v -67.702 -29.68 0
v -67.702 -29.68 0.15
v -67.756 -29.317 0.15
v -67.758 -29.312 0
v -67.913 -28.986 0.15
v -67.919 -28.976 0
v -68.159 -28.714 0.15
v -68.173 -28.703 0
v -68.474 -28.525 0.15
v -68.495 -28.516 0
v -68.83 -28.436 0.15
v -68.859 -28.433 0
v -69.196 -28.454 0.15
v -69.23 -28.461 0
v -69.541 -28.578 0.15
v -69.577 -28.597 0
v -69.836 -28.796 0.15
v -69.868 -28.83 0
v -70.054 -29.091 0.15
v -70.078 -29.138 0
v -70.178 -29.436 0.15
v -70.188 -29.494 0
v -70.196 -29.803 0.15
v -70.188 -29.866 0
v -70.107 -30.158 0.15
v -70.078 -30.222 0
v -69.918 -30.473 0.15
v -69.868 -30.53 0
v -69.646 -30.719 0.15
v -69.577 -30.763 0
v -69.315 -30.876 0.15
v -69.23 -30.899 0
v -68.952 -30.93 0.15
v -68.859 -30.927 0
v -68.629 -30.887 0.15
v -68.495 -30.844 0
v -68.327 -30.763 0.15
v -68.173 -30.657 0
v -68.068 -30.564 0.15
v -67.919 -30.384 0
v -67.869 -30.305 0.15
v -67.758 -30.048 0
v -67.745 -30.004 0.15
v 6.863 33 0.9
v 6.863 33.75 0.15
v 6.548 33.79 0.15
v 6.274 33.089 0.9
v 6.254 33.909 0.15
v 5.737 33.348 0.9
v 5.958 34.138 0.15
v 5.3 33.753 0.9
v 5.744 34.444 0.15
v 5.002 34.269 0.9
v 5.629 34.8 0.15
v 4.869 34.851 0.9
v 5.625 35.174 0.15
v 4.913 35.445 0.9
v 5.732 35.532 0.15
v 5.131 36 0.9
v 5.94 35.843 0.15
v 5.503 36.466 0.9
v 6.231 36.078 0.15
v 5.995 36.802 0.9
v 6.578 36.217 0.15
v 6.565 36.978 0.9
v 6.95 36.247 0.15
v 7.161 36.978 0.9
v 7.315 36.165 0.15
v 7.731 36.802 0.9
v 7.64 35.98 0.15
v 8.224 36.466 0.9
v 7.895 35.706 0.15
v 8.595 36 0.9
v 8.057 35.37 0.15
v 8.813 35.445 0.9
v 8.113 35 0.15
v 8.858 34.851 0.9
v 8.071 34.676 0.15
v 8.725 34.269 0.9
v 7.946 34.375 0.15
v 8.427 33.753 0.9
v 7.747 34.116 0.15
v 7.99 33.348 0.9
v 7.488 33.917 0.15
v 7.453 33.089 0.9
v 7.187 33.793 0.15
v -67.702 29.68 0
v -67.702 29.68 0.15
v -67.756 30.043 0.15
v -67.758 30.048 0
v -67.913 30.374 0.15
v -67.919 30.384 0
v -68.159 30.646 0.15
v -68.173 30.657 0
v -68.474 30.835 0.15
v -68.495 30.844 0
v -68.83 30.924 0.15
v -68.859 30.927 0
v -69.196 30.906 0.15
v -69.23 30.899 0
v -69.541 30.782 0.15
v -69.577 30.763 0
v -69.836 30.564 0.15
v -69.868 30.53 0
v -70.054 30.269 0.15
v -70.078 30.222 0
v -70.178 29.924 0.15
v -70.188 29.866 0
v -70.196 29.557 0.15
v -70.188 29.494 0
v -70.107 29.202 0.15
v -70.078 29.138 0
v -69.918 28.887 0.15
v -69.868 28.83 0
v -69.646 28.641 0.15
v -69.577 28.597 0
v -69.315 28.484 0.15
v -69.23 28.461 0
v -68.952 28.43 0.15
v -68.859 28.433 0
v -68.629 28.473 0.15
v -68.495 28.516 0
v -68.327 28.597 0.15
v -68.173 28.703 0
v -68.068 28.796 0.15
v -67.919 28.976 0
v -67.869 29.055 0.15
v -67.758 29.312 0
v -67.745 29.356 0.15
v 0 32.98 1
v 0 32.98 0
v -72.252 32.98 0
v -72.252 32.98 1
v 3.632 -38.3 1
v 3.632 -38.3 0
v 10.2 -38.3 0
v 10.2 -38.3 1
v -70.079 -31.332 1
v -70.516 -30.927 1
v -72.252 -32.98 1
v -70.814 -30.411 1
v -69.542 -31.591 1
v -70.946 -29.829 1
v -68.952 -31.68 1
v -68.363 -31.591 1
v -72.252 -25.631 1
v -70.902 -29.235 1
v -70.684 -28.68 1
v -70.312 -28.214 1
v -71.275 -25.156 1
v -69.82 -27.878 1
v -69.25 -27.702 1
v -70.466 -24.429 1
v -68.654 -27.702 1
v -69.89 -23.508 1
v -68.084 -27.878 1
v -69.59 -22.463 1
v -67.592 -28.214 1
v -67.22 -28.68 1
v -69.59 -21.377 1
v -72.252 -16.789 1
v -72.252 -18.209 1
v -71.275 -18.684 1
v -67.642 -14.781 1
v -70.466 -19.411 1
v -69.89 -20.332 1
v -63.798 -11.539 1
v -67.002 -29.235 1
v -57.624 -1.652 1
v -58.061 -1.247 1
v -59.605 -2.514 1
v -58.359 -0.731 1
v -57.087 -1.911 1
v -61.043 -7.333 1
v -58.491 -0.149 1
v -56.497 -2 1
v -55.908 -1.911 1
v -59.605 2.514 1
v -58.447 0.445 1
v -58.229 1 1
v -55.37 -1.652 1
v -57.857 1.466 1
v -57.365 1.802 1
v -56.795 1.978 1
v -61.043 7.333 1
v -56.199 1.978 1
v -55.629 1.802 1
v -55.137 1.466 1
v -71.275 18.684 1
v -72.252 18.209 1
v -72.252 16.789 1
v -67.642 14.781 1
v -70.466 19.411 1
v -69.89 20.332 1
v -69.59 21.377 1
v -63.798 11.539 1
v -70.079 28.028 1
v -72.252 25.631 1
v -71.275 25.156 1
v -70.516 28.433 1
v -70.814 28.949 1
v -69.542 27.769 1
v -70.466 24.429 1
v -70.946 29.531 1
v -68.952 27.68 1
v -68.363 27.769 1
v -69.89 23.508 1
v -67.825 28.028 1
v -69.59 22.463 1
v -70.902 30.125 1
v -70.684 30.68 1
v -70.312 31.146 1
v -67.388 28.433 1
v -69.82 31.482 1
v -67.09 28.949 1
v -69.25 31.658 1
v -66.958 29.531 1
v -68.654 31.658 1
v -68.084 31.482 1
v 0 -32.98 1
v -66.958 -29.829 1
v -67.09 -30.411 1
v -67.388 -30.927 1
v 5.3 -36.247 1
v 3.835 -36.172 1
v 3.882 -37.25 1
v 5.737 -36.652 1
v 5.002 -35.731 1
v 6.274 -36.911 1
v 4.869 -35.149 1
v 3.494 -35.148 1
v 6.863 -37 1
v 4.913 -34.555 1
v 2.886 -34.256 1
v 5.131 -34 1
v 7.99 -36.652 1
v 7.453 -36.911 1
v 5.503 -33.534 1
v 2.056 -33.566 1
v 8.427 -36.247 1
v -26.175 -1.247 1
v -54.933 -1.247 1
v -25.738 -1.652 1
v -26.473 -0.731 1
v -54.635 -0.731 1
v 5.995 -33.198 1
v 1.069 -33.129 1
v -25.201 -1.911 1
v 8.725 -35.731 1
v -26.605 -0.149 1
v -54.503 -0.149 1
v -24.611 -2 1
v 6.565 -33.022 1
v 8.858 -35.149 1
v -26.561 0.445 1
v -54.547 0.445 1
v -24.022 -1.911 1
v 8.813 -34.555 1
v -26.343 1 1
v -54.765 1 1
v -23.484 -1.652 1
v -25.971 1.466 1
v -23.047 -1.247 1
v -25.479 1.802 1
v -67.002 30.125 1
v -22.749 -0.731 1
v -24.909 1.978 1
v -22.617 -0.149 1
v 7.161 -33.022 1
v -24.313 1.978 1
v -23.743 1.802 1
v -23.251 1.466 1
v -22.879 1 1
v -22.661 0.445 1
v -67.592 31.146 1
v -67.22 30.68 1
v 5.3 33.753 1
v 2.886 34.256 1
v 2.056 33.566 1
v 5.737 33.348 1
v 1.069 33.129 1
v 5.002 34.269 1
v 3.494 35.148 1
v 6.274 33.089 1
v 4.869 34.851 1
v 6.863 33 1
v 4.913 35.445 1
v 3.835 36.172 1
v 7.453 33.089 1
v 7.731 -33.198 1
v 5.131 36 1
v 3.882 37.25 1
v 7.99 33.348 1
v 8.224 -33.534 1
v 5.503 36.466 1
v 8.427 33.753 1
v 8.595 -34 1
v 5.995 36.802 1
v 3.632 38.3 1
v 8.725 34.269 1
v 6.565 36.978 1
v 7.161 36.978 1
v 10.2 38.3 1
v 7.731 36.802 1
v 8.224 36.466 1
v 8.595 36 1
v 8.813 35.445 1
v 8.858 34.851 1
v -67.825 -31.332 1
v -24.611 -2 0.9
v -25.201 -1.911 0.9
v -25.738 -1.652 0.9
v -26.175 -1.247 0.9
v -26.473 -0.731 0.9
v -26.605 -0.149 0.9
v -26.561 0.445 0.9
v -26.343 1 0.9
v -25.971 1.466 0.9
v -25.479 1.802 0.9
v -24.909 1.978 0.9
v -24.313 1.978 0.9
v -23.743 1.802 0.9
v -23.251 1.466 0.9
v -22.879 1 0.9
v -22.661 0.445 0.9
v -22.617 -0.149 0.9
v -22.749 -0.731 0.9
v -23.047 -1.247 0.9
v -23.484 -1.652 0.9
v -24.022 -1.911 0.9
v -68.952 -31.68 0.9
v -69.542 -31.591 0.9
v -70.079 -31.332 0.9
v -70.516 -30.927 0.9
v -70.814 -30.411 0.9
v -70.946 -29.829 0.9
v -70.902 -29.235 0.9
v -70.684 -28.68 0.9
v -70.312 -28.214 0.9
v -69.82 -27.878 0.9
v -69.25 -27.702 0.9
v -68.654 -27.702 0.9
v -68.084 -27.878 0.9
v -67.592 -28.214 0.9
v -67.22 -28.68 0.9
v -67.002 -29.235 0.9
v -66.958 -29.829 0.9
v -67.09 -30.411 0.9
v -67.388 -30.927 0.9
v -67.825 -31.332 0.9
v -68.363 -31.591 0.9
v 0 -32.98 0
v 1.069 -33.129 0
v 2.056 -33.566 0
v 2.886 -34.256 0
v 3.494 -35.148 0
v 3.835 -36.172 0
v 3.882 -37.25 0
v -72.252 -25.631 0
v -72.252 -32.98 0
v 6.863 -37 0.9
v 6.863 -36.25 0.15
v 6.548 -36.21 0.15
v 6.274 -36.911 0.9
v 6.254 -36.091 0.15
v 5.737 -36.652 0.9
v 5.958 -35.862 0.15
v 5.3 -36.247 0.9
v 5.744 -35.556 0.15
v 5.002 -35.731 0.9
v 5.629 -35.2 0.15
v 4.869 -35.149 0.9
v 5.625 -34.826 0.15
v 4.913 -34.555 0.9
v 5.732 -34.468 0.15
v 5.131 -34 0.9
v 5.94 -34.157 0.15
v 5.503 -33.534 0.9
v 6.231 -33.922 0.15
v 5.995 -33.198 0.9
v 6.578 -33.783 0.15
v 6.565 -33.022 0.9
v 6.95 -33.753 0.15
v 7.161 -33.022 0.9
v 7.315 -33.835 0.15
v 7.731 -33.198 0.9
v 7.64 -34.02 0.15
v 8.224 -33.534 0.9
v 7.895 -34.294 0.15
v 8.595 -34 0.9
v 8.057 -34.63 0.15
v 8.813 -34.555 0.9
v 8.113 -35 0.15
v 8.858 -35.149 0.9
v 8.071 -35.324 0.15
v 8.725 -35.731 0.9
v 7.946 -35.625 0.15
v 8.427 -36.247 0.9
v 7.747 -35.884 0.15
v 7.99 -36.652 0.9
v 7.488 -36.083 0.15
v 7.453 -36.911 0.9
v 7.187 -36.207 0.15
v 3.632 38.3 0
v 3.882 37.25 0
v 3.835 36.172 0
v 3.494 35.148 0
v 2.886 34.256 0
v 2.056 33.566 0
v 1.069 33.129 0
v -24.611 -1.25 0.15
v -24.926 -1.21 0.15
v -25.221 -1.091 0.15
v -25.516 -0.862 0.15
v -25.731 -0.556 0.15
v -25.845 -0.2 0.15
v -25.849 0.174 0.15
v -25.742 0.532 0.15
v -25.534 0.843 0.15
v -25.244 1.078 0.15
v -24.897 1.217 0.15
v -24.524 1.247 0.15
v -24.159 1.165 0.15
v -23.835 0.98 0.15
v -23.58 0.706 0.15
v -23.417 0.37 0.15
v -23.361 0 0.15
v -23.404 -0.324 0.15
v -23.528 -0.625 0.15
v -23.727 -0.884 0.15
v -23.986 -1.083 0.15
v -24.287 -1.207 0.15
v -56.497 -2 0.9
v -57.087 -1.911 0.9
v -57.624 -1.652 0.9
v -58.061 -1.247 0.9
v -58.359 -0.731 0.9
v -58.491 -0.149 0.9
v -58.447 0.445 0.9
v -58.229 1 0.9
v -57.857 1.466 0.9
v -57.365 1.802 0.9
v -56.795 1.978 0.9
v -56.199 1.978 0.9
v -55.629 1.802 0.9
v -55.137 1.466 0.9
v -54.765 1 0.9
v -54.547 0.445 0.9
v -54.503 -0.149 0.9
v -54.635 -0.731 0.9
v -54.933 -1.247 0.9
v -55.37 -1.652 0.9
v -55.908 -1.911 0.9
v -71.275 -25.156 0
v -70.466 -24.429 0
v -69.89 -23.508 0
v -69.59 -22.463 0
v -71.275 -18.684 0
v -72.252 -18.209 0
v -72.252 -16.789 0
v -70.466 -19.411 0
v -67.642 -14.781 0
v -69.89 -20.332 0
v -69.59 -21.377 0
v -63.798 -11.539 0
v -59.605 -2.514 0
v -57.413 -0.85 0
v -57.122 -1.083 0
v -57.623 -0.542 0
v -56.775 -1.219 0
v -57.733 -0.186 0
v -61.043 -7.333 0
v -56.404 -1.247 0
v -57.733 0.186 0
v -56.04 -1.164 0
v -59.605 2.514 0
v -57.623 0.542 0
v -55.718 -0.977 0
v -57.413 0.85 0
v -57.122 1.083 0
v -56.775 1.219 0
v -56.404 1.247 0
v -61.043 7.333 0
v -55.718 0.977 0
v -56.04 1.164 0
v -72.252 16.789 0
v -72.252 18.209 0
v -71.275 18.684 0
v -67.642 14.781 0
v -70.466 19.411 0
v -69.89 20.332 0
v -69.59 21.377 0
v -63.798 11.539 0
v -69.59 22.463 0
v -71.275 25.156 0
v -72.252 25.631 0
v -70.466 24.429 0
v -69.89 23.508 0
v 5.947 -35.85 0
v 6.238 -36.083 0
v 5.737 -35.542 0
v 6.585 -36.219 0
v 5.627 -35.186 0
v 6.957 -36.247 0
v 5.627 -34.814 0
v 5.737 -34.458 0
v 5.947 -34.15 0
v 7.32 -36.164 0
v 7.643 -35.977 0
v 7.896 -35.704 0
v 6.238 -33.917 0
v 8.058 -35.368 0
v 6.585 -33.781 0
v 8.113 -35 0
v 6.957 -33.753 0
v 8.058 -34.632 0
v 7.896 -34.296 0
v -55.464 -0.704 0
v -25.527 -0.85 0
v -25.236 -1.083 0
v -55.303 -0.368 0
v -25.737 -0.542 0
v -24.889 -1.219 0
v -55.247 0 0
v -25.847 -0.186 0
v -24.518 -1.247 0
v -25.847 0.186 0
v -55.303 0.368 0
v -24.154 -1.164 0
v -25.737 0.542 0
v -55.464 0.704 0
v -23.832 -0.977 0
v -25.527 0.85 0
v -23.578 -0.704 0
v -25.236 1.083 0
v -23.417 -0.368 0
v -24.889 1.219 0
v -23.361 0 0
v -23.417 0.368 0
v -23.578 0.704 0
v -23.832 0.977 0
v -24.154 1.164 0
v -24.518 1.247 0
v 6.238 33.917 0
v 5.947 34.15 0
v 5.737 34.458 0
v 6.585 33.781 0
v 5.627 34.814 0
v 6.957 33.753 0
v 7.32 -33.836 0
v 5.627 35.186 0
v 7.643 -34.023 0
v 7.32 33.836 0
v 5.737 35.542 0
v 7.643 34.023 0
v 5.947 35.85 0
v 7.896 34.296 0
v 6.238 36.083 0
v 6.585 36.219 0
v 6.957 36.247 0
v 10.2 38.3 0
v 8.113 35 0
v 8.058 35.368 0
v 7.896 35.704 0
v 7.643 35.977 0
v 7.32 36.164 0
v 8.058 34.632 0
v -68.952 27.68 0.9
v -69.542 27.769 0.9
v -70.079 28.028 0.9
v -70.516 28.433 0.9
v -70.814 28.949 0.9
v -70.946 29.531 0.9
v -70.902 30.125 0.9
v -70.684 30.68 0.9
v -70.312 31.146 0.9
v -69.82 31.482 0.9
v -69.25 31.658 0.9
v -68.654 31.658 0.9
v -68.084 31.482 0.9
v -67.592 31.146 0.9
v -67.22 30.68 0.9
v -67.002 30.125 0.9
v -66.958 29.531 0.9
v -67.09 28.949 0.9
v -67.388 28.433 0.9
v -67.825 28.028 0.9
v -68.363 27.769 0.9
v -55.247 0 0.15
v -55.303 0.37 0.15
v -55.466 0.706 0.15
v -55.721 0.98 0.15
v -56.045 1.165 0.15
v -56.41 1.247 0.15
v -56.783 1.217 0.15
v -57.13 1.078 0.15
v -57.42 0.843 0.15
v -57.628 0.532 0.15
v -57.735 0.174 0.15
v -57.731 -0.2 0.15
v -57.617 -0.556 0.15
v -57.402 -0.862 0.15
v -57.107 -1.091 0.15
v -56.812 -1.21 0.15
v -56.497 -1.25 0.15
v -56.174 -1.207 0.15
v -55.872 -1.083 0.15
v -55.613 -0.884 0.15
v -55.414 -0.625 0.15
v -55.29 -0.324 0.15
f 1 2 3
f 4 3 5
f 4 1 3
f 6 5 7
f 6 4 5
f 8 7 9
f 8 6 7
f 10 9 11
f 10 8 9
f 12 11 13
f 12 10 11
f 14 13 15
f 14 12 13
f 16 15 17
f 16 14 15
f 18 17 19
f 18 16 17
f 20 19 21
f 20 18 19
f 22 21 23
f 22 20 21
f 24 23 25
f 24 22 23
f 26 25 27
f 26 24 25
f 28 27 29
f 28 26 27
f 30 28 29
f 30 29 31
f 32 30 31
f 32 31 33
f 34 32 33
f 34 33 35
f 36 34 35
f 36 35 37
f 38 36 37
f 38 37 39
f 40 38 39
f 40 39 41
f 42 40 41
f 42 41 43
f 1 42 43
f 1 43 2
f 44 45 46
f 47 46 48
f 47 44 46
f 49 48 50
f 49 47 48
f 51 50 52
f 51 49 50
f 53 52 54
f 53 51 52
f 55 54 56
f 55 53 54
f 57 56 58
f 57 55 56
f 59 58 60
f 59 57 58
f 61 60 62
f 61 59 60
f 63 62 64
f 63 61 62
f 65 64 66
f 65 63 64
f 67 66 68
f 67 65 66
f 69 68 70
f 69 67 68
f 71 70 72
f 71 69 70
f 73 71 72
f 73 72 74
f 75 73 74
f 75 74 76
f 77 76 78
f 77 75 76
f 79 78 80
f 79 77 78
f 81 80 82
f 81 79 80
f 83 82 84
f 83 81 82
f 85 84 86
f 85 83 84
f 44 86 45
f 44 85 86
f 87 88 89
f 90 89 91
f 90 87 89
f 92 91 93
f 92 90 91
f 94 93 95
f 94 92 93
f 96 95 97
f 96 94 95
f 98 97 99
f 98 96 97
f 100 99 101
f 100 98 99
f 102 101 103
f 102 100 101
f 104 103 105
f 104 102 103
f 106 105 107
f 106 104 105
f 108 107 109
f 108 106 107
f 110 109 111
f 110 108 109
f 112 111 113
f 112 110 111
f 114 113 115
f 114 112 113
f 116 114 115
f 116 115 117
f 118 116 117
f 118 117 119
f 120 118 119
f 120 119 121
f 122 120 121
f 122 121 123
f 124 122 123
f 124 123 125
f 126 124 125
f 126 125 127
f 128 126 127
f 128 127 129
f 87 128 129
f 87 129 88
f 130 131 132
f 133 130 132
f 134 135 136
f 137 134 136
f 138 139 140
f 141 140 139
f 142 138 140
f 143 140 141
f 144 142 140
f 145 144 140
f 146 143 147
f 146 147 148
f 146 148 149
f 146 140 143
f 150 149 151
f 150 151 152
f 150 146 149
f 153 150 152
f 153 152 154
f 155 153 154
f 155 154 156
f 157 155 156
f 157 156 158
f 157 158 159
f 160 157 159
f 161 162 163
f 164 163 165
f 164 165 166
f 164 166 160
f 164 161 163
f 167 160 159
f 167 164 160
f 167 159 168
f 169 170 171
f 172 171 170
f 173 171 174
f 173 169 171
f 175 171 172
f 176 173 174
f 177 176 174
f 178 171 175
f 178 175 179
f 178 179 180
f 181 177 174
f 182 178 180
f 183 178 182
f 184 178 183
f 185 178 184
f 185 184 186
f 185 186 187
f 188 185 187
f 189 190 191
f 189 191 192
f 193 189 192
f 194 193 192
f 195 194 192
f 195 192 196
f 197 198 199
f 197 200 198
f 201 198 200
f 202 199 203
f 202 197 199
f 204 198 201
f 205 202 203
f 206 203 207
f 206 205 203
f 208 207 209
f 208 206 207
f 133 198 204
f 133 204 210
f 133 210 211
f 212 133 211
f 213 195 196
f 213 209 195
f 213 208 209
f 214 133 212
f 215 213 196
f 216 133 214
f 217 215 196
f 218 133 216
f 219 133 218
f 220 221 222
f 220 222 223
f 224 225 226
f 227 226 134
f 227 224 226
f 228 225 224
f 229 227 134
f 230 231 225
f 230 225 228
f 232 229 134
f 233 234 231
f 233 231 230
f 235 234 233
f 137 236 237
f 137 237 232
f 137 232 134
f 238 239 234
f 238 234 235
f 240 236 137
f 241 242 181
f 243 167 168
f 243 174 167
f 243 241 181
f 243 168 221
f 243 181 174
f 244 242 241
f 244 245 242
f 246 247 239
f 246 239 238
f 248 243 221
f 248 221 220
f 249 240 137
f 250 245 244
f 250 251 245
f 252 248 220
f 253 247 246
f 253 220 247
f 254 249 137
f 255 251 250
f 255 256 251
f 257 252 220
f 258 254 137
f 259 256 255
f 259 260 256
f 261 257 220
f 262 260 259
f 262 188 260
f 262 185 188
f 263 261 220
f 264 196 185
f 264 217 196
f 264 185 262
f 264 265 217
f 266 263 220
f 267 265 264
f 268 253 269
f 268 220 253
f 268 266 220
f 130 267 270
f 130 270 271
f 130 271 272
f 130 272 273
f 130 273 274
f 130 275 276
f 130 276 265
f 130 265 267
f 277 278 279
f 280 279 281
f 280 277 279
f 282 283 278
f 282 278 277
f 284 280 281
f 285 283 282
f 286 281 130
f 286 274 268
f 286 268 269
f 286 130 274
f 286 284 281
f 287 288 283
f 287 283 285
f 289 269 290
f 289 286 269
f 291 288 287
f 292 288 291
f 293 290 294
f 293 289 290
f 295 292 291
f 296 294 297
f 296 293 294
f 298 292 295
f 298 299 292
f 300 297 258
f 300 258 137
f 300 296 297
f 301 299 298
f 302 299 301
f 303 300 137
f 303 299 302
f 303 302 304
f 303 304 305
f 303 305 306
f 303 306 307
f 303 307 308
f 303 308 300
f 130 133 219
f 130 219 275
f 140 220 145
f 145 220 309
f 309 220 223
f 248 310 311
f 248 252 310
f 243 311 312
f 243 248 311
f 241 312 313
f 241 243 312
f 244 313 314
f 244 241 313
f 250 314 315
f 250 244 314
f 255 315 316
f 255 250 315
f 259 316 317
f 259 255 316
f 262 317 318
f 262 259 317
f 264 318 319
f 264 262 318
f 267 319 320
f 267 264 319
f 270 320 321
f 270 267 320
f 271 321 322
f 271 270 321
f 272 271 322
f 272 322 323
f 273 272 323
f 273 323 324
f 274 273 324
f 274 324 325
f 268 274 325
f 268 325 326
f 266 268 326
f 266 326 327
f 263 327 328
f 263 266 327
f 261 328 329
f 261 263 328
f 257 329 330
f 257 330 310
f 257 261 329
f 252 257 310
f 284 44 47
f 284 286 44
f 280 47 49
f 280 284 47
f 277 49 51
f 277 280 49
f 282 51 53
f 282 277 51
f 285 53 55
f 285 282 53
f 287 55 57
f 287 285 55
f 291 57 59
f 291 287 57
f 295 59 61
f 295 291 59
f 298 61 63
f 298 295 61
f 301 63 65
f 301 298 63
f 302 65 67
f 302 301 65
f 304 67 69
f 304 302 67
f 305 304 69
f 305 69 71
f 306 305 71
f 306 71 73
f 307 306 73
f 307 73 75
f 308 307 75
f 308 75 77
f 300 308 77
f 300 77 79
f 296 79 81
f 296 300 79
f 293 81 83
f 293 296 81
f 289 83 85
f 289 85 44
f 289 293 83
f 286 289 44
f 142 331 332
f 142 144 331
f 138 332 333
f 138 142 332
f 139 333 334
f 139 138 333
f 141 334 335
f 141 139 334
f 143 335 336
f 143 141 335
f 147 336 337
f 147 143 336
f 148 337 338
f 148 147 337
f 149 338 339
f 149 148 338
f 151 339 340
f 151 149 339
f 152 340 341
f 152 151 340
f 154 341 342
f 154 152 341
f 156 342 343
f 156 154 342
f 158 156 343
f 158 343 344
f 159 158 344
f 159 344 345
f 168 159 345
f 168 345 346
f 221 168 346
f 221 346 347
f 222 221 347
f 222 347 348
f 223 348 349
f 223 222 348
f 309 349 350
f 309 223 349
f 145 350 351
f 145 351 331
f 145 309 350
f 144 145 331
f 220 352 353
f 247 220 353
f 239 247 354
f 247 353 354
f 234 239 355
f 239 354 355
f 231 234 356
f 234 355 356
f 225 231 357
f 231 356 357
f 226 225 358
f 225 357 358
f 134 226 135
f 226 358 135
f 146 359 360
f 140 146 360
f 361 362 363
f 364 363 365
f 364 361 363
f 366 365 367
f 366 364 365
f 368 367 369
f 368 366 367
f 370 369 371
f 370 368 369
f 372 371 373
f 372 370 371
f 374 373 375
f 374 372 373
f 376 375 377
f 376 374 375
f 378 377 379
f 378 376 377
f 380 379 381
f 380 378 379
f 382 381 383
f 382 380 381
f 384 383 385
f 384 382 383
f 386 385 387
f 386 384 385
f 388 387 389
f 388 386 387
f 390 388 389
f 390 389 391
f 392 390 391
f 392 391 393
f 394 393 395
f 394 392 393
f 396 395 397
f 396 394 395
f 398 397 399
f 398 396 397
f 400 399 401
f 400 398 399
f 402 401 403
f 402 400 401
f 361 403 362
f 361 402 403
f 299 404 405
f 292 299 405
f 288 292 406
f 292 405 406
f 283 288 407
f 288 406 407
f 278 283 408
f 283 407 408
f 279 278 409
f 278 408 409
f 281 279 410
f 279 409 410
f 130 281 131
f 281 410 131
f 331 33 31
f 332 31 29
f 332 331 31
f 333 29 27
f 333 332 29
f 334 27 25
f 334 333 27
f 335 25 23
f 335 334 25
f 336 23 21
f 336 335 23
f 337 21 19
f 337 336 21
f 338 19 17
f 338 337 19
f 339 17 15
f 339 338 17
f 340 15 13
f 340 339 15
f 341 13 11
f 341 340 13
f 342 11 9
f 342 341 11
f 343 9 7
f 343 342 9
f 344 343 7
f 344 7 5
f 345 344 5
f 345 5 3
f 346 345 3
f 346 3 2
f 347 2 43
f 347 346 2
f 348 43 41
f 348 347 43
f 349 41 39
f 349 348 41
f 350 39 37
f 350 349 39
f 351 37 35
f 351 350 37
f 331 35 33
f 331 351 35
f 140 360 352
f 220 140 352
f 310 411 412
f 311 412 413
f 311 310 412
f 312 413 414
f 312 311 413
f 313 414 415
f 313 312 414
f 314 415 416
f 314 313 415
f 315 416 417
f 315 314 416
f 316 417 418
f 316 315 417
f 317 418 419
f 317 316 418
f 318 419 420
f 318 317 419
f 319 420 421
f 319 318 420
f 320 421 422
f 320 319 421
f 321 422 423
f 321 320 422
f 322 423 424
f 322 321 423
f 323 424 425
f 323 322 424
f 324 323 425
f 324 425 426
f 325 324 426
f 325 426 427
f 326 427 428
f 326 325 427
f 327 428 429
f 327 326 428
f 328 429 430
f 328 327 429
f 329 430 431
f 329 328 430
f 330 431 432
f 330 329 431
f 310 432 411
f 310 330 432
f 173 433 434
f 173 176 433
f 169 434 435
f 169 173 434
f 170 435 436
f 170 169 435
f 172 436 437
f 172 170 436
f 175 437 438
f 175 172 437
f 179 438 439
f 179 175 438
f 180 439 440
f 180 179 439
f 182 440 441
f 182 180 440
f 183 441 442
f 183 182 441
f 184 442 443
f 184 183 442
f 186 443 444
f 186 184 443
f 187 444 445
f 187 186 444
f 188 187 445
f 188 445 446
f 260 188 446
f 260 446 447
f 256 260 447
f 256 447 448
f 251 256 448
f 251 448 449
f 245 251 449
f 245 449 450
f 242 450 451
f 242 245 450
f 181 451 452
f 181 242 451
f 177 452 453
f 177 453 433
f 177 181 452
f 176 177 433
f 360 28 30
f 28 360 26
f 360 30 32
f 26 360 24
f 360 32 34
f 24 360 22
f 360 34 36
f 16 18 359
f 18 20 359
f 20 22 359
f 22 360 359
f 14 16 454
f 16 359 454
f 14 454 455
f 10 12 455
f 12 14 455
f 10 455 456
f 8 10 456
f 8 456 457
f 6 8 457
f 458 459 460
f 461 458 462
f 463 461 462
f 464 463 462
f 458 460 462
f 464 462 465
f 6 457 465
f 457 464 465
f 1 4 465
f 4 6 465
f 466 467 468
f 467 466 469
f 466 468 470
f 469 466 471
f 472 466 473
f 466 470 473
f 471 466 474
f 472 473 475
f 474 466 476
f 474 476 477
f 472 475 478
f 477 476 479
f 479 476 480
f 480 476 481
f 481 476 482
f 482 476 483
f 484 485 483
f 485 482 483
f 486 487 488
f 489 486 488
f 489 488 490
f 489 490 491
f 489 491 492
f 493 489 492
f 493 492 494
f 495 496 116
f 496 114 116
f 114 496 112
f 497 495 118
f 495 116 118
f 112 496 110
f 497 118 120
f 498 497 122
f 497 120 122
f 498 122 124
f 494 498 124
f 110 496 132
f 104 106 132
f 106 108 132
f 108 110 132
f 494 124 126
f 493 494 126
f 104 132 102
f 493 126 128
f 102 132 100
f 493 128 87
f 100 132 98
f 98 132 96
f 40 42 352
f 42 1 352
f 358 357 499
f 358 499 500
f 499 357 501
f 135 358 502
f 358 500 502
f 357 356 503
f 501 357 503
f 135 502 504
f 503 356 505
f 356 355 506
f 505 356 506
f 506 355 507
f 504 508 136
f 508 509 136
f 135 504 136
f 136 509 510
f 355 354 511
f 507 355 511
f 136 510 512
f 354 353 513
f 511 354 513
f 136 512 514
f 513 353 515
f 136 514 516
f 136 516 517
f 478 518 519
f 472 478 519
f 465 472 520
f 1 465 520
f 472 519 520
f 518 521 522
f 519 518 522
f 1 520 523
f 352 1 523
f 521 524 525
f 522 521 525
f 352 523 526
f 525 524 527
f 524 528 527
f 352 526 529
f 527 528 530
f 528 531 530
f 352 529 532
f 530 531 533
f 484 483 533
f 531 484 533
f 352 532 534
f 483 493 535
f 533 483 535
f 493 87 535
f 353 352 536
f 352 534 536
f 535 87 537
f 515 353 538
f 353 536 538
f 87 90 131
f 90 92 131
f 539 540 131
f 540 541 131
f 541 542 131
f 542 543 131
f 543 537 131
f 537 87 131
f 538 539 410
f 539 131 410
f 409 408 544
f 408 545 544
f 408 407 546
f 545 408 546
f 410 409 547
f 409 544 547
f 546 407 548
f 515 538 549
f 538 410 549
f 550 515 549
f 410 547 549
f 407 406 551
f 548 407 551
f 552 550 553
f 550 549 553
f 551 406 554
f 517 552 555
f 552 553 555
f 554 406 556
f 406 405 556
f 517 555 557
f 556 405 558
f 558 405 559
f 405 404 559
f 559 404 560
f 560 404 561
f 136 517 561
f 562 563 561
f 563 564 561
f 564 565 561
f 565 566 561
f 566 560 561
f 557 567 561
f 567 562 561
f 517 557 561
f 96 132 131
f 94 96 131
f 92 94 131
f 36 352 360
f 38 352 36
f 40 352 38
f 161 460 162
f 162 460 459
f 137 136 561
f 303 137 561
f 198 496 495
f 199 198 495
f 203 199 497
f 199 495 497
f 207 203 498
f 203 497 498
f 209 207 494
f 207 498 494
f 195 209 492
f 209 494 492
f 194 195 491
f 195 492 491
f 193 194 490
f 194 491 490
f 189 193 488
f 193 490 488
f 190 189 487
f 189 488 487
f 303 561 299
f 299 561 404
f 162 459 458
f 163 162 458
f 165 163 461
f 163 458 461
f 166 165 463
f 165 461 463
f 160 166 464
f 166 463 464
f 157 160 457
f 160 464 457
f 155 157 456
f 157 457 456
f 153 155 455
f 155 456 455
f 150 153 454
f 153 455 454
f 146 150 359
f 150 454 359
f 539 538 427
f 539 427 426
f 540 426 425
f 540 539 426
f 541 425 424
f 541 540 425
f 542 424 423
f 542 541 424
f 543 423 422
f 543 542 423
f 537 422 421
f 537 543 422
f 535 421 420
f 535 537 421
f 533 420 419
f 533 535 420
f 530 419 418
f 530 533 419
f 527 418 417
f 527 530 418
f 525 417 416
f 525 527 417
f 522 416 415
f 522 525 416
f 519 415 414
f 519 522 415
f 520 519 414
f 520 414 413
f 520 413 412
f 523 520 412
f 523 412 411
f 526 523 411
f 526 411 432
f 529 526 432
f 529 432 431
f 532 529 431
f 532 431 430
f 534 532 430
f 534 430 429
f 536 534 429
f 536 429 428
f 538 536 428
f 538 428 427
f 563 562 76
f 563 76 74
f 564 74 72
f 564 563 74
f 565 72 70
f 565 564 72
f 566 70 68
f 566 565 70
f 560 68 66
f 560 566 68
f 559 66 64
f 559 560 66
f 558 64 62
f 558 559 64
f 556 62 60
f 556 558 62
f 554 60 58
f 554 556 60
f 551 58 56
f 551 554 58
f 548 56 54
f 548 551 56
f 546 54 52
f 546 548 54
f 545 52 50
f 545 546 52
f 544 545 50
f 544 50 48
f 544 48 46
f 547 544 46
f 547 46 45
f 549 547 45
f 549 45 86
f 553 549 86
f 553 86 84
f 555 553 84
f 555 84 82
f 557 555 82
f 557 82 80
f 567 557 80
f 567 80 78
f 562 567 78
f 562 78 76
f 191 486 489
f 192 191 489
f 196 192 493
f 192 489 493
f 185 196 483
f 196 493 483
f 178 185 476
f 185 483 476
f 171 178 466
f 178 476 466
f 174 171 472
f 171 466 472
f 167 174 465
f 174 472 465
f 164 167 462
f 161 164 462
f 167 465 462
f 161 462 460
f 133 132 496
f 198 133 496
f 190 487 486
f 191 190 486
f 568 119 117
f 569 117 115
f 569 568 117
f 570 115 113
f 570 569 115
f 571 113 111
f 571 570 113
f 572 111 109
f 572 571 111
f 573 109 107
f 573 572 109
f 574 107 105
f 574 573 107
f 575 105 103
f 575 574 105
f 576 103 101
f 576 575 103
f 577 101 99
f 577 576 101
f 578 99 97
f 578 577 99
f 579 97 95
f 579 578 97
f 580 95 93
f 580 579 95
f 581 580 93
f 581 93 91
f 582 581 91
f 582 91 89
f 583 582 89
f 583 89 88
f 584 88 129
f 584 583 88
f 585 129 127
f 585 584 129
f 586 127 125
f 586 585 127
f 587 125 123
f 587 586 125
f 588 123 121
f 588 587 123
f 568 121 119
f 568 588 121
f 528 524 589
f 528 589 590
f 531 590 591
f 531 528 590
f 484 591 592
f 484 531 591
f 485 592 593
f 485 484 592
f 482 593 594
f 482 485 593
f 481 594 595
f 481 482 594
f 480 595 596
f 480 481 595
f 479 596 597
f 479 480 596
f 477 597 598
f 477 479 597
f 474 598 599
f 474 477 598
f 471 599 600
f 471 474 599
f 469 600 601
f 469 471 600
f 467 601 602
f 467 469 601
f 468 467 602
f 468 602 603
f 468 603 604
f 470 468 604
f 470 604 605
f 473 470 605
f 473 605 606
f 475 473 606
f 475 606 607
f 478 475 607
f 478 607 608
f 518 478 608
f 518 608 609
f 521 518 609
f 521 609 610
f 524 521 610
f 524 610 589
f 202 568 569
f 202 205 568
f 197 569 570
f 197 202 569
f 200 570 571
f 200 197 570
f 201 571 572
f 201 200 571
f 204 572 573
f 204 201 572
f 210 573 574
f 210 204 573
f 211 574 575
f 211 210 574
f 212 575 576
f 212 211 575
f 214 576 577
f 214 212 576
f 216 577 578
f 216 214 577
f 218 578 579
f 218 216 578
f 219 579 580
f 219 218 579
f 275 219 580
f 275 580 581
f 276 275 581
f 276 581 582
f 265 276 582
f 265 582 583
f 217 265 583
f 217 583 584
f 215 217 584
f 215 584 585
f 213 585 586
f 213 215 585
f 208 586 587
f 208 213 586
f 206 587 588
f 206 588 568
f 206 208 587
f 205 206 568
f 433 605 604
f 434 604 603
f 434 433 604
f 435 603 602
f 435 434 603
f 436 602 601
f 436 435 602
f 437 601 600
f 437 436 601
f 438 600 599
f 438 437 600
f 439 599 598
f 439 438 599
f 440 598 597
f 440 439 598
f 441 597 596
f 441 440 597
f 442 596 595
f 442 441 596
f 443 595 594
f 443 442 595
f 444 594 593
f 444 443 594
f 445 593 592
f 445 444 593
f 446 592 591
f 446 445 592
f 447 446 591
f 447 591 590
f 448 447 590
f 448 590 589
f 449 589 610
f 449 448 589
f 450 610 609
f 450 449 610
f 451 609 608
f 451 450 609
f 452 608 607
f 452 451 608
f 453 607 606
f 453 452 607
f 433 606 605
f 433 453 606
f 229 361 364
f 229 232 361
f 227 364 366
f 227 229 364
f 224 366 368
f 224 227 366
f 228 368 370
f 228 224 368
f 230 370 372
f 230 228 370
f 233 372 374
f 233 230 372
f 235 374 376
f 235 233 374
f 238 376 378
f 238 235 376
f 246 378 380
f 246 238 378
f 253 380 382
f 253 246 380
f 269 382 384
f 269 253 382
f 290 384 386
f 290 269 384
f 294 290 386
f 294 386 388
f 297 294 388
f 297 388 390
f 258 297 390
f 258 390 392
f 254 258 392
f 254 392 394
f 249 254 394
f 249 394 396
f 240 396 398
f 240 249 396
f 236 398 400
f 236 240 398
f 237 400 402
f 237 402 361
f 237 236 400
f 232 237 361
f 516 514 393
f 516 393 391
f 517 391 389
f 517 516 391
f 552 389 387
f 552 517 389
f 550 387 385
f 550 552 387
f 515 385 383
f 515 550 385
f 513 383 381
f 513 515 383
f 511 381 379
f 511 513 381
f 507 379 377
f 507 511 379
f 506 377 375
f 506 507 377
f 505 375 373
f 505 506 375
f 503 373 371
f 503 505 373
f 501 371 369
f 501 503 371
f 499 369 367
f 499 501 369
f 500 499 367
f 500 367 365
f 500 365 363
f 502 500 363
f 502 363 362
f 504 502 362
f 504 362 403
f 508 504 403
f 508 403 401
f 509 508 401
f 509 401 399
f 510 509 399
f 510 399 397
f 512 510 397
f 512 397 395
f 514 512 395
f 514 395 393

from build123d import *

# Parameters (mm, degrees)
SKETCH1_R                                      = 1.25
SHAPE_DEPTH                                    = 1
CSK_FOR_M2_FLAT_HEAD_MACHINE_SCREW1_AT_2_COUNT = 2
CSK_FOR_M2_FLAT_HEAD_MACHINE_SCREW1_AT_2_PITCH = 76.001699467
CSK_FOR_M2_FLAT_HEAD_MACHINE_SCREW1_AT_3_COUNT = 2
CSK_FOR_M2_FLAT_HEAD_MACHINE_SCREW1_AT_3_PITCH = 99.656702343
CSK_FOR_M2_FLAT_HEAD_MACHINE_SCREW1_AT_4_COUNT = 2
CSK_FOR_M2_FLAT_HEAD_MACHINE_SCREW1_AT_4_PITCH = 59.36
CSK_FOR_M2_FLAT_HEAD_MACHINE_SCREW1_AT_5_COUNT = 2
CSK_FOR_M2_FLAT_HEAD_MACHINE_SCREW1_AT_5_PITCH = 32.187410971
CSK_FOR_M2_FLAT_HEAD_MACHINE_SCREW1_AT_6_COUNT = 2
CSK_FOR_M2_FLAT_HEAD_MACHINE_SCREW1_AT_6_PITCH = 53.357546763


with BuildPart() as part:
    # Sketch1 → Shape (new body)
    with BuildSketch(Plane.XY):
        with BuildLine():
            Line((10.2, -38.3), (10.2, 38.3))
            Line((10.2, 38.3), (3.632299547, 38.3))
            ThreePointArc((3.632299547, 38.3), (3.220869448, 34.680909279), (0, 32.98))
            Line((0, 32.98), (-72.252025159, 32.98))
            Line((-72.252025159, 32.98), (-72.252025159, 25.630795063))
            ThreePointArc((-72.252025159, 25.630795063), (-69.552025159, 21.92), (-72.252025159, 18.209204937))
            Line((-72.252025159, 18.209204937), (-72.252025159, 16.789136368))
            ThreePointArc((-72.252025159, 16.789136368), (-59.422025159, 0), (-72.252025159, -16.789136368))
            Line((-72.252025159, -16.789136368), (-72.252025159, -18.209204937))
            ThreePointArc((-72.252025159, -18.209204937), (-69.552025159, -21.92), (-72.252025159, -25.630795063))
            Line((-72.252025159, -25.630795063), (-72.252025159, -32.98))
            Line((-72.252025159, -32.98), (0, -32.98))
            ThreePointArc((0, -32.98), (3.220869448, -34.680909279), (3.632299547, -38.3))
            Line((3.632299547, -38.3), (10.2, -38.3))
        make_face()
        with Locations((-68.952025159, 29.68)):
            Circle(SKETCH1_R, mode=Mode.SUBTRACT)
        with Locations((6.863249831, 35)):
            Circle(SKETCH1_R, mode=Mode.SUBTRACT)
        with Locations((6.863249831, -35)):
            Circle(SKETCH1_R, mode=Mode.SUBTRACT)
        with Locations((-68.952025159, -29.68)):
            Circle(SKETCH1_R, mode=Mode.SUBTRACT)
        with Locations((-56.497025159, 0)):
            Circle(SKETCH1_R, mode=Mode.SUBTRACT)
        with Locations((-24.61101258, 0)):
            Circle(SKETCH1_R, mode=Mode.SUBTRACT)
    extrude(amount=SHAPE_DEPTH)

    # Sketch3 → CSK for M2 Flat Head Machine Screw1 (revolve, cut)
    with BuildSketch(Plane(origin=(-68.952025159, 29.68, 1), x_dir=(0, -1, 0), z_dir=(1, 0, 0))):
        Polygon((0, 0), (0, 1), (1, 1), (1, 1.1), (2, 0.1), (2, 0), align=None)
    csk_for_m2_flat_head_machine_screw1 = revolve(axis=Axis((-68.952025159, 29.68, 7.35), (0, 0, -1)), mode=Mode.SUBTRACT)

    # CSK for M2 Flat Head Machine Screw1 at 2: CSK for M2 Flat Head Machine Screw1 ×2
    with Locations(*[Vector(0.997547101, 0.069998435, 0) * (i * CSK_FOR_M2_FLAT_HEAD_MACHINE_SCREW1_AT_2_PITCH) for i in range(1, CSK_FOR_M2_FLAT_HEAD_MACHINE_SCREW1_AT_2_COUNT)]):
        add(csk_for_m2_flat_head_machine_screw1, mode=Mode.SUBTRACT)

    # CSK for M2 Flat Head Machine Screw1 at 3: CSK for M2 Flat Head Machine Screw1 ×2
    with Locations(*[Vector(0.760764436, -0.649028098, 0) * (i * CSK_FOR_M2_FLAT_HEAD_MACHINE_SCREW1_AT_3_PITCH) for i in range(1, CSK_FOR_M2_FLAT_HEAD_MACHINE_SCREW1_AT_3_COUNT)]):
        add(csk_for_m2_flat_head_machine_screw1, mode=Mode.SUBTRACT)

    # CSK for M2 Flat Head Machine Screw1 at 4: CSK for M2 Flat Head Machine Screw1 ×2
    with Locations(*[(0, -i * CSK_FOR_M2_FLAT_HEAD_MACHINE_SCREW1_AT_4_PITCH, 0) for i in range(1, CSK_FOR_M2_FLAT_HEAD_MACHINE_SCREW1_AT_4_COUNT)]):
        add(csk_for_m2_flat_head_machine_screw1, mode=Mode.SUBTRACT)

    # CSK for M2 Flat Head Machine Screw1 at 5: CSK for M2 Flat Head Machine Screw1 ×2
    with Locations(*[Vector(0.386952527, -0.922099638, 0) * (i * CSK_FOR_M2_FLAT_HEAD_MACHINE_SCREW1_AT_5_PITCH) for i in range(1, CSK_FOR_M2_FLAT_HEAD_MACHINE_SCREW1_AT_5_COUNT)]):
        add(csk_for_m2_flat_head_machine_screw1, mode=Mode.SUBTRACT)

    # CSK for M2 Flat Head Machine Screw1 at 6: CSK for M2 Flat Head Machine Screw1 ×2
    with Locations(*[Vector(0.831016703, -0.556247463, 0) * (i * CSK_FOR_M2_FLAT_HEAD_MACHINE_SCREW1_AT_6_PITCH) for i in range(1, CSK_FOR_M2_FLAT_HEAD_MACHINE_SCREW1_AT_6_COUNT)]):
        add(csk_for_m2_flat_head_machine_screw1, mode=Mode.SUBTRACT)


solid = part.part
